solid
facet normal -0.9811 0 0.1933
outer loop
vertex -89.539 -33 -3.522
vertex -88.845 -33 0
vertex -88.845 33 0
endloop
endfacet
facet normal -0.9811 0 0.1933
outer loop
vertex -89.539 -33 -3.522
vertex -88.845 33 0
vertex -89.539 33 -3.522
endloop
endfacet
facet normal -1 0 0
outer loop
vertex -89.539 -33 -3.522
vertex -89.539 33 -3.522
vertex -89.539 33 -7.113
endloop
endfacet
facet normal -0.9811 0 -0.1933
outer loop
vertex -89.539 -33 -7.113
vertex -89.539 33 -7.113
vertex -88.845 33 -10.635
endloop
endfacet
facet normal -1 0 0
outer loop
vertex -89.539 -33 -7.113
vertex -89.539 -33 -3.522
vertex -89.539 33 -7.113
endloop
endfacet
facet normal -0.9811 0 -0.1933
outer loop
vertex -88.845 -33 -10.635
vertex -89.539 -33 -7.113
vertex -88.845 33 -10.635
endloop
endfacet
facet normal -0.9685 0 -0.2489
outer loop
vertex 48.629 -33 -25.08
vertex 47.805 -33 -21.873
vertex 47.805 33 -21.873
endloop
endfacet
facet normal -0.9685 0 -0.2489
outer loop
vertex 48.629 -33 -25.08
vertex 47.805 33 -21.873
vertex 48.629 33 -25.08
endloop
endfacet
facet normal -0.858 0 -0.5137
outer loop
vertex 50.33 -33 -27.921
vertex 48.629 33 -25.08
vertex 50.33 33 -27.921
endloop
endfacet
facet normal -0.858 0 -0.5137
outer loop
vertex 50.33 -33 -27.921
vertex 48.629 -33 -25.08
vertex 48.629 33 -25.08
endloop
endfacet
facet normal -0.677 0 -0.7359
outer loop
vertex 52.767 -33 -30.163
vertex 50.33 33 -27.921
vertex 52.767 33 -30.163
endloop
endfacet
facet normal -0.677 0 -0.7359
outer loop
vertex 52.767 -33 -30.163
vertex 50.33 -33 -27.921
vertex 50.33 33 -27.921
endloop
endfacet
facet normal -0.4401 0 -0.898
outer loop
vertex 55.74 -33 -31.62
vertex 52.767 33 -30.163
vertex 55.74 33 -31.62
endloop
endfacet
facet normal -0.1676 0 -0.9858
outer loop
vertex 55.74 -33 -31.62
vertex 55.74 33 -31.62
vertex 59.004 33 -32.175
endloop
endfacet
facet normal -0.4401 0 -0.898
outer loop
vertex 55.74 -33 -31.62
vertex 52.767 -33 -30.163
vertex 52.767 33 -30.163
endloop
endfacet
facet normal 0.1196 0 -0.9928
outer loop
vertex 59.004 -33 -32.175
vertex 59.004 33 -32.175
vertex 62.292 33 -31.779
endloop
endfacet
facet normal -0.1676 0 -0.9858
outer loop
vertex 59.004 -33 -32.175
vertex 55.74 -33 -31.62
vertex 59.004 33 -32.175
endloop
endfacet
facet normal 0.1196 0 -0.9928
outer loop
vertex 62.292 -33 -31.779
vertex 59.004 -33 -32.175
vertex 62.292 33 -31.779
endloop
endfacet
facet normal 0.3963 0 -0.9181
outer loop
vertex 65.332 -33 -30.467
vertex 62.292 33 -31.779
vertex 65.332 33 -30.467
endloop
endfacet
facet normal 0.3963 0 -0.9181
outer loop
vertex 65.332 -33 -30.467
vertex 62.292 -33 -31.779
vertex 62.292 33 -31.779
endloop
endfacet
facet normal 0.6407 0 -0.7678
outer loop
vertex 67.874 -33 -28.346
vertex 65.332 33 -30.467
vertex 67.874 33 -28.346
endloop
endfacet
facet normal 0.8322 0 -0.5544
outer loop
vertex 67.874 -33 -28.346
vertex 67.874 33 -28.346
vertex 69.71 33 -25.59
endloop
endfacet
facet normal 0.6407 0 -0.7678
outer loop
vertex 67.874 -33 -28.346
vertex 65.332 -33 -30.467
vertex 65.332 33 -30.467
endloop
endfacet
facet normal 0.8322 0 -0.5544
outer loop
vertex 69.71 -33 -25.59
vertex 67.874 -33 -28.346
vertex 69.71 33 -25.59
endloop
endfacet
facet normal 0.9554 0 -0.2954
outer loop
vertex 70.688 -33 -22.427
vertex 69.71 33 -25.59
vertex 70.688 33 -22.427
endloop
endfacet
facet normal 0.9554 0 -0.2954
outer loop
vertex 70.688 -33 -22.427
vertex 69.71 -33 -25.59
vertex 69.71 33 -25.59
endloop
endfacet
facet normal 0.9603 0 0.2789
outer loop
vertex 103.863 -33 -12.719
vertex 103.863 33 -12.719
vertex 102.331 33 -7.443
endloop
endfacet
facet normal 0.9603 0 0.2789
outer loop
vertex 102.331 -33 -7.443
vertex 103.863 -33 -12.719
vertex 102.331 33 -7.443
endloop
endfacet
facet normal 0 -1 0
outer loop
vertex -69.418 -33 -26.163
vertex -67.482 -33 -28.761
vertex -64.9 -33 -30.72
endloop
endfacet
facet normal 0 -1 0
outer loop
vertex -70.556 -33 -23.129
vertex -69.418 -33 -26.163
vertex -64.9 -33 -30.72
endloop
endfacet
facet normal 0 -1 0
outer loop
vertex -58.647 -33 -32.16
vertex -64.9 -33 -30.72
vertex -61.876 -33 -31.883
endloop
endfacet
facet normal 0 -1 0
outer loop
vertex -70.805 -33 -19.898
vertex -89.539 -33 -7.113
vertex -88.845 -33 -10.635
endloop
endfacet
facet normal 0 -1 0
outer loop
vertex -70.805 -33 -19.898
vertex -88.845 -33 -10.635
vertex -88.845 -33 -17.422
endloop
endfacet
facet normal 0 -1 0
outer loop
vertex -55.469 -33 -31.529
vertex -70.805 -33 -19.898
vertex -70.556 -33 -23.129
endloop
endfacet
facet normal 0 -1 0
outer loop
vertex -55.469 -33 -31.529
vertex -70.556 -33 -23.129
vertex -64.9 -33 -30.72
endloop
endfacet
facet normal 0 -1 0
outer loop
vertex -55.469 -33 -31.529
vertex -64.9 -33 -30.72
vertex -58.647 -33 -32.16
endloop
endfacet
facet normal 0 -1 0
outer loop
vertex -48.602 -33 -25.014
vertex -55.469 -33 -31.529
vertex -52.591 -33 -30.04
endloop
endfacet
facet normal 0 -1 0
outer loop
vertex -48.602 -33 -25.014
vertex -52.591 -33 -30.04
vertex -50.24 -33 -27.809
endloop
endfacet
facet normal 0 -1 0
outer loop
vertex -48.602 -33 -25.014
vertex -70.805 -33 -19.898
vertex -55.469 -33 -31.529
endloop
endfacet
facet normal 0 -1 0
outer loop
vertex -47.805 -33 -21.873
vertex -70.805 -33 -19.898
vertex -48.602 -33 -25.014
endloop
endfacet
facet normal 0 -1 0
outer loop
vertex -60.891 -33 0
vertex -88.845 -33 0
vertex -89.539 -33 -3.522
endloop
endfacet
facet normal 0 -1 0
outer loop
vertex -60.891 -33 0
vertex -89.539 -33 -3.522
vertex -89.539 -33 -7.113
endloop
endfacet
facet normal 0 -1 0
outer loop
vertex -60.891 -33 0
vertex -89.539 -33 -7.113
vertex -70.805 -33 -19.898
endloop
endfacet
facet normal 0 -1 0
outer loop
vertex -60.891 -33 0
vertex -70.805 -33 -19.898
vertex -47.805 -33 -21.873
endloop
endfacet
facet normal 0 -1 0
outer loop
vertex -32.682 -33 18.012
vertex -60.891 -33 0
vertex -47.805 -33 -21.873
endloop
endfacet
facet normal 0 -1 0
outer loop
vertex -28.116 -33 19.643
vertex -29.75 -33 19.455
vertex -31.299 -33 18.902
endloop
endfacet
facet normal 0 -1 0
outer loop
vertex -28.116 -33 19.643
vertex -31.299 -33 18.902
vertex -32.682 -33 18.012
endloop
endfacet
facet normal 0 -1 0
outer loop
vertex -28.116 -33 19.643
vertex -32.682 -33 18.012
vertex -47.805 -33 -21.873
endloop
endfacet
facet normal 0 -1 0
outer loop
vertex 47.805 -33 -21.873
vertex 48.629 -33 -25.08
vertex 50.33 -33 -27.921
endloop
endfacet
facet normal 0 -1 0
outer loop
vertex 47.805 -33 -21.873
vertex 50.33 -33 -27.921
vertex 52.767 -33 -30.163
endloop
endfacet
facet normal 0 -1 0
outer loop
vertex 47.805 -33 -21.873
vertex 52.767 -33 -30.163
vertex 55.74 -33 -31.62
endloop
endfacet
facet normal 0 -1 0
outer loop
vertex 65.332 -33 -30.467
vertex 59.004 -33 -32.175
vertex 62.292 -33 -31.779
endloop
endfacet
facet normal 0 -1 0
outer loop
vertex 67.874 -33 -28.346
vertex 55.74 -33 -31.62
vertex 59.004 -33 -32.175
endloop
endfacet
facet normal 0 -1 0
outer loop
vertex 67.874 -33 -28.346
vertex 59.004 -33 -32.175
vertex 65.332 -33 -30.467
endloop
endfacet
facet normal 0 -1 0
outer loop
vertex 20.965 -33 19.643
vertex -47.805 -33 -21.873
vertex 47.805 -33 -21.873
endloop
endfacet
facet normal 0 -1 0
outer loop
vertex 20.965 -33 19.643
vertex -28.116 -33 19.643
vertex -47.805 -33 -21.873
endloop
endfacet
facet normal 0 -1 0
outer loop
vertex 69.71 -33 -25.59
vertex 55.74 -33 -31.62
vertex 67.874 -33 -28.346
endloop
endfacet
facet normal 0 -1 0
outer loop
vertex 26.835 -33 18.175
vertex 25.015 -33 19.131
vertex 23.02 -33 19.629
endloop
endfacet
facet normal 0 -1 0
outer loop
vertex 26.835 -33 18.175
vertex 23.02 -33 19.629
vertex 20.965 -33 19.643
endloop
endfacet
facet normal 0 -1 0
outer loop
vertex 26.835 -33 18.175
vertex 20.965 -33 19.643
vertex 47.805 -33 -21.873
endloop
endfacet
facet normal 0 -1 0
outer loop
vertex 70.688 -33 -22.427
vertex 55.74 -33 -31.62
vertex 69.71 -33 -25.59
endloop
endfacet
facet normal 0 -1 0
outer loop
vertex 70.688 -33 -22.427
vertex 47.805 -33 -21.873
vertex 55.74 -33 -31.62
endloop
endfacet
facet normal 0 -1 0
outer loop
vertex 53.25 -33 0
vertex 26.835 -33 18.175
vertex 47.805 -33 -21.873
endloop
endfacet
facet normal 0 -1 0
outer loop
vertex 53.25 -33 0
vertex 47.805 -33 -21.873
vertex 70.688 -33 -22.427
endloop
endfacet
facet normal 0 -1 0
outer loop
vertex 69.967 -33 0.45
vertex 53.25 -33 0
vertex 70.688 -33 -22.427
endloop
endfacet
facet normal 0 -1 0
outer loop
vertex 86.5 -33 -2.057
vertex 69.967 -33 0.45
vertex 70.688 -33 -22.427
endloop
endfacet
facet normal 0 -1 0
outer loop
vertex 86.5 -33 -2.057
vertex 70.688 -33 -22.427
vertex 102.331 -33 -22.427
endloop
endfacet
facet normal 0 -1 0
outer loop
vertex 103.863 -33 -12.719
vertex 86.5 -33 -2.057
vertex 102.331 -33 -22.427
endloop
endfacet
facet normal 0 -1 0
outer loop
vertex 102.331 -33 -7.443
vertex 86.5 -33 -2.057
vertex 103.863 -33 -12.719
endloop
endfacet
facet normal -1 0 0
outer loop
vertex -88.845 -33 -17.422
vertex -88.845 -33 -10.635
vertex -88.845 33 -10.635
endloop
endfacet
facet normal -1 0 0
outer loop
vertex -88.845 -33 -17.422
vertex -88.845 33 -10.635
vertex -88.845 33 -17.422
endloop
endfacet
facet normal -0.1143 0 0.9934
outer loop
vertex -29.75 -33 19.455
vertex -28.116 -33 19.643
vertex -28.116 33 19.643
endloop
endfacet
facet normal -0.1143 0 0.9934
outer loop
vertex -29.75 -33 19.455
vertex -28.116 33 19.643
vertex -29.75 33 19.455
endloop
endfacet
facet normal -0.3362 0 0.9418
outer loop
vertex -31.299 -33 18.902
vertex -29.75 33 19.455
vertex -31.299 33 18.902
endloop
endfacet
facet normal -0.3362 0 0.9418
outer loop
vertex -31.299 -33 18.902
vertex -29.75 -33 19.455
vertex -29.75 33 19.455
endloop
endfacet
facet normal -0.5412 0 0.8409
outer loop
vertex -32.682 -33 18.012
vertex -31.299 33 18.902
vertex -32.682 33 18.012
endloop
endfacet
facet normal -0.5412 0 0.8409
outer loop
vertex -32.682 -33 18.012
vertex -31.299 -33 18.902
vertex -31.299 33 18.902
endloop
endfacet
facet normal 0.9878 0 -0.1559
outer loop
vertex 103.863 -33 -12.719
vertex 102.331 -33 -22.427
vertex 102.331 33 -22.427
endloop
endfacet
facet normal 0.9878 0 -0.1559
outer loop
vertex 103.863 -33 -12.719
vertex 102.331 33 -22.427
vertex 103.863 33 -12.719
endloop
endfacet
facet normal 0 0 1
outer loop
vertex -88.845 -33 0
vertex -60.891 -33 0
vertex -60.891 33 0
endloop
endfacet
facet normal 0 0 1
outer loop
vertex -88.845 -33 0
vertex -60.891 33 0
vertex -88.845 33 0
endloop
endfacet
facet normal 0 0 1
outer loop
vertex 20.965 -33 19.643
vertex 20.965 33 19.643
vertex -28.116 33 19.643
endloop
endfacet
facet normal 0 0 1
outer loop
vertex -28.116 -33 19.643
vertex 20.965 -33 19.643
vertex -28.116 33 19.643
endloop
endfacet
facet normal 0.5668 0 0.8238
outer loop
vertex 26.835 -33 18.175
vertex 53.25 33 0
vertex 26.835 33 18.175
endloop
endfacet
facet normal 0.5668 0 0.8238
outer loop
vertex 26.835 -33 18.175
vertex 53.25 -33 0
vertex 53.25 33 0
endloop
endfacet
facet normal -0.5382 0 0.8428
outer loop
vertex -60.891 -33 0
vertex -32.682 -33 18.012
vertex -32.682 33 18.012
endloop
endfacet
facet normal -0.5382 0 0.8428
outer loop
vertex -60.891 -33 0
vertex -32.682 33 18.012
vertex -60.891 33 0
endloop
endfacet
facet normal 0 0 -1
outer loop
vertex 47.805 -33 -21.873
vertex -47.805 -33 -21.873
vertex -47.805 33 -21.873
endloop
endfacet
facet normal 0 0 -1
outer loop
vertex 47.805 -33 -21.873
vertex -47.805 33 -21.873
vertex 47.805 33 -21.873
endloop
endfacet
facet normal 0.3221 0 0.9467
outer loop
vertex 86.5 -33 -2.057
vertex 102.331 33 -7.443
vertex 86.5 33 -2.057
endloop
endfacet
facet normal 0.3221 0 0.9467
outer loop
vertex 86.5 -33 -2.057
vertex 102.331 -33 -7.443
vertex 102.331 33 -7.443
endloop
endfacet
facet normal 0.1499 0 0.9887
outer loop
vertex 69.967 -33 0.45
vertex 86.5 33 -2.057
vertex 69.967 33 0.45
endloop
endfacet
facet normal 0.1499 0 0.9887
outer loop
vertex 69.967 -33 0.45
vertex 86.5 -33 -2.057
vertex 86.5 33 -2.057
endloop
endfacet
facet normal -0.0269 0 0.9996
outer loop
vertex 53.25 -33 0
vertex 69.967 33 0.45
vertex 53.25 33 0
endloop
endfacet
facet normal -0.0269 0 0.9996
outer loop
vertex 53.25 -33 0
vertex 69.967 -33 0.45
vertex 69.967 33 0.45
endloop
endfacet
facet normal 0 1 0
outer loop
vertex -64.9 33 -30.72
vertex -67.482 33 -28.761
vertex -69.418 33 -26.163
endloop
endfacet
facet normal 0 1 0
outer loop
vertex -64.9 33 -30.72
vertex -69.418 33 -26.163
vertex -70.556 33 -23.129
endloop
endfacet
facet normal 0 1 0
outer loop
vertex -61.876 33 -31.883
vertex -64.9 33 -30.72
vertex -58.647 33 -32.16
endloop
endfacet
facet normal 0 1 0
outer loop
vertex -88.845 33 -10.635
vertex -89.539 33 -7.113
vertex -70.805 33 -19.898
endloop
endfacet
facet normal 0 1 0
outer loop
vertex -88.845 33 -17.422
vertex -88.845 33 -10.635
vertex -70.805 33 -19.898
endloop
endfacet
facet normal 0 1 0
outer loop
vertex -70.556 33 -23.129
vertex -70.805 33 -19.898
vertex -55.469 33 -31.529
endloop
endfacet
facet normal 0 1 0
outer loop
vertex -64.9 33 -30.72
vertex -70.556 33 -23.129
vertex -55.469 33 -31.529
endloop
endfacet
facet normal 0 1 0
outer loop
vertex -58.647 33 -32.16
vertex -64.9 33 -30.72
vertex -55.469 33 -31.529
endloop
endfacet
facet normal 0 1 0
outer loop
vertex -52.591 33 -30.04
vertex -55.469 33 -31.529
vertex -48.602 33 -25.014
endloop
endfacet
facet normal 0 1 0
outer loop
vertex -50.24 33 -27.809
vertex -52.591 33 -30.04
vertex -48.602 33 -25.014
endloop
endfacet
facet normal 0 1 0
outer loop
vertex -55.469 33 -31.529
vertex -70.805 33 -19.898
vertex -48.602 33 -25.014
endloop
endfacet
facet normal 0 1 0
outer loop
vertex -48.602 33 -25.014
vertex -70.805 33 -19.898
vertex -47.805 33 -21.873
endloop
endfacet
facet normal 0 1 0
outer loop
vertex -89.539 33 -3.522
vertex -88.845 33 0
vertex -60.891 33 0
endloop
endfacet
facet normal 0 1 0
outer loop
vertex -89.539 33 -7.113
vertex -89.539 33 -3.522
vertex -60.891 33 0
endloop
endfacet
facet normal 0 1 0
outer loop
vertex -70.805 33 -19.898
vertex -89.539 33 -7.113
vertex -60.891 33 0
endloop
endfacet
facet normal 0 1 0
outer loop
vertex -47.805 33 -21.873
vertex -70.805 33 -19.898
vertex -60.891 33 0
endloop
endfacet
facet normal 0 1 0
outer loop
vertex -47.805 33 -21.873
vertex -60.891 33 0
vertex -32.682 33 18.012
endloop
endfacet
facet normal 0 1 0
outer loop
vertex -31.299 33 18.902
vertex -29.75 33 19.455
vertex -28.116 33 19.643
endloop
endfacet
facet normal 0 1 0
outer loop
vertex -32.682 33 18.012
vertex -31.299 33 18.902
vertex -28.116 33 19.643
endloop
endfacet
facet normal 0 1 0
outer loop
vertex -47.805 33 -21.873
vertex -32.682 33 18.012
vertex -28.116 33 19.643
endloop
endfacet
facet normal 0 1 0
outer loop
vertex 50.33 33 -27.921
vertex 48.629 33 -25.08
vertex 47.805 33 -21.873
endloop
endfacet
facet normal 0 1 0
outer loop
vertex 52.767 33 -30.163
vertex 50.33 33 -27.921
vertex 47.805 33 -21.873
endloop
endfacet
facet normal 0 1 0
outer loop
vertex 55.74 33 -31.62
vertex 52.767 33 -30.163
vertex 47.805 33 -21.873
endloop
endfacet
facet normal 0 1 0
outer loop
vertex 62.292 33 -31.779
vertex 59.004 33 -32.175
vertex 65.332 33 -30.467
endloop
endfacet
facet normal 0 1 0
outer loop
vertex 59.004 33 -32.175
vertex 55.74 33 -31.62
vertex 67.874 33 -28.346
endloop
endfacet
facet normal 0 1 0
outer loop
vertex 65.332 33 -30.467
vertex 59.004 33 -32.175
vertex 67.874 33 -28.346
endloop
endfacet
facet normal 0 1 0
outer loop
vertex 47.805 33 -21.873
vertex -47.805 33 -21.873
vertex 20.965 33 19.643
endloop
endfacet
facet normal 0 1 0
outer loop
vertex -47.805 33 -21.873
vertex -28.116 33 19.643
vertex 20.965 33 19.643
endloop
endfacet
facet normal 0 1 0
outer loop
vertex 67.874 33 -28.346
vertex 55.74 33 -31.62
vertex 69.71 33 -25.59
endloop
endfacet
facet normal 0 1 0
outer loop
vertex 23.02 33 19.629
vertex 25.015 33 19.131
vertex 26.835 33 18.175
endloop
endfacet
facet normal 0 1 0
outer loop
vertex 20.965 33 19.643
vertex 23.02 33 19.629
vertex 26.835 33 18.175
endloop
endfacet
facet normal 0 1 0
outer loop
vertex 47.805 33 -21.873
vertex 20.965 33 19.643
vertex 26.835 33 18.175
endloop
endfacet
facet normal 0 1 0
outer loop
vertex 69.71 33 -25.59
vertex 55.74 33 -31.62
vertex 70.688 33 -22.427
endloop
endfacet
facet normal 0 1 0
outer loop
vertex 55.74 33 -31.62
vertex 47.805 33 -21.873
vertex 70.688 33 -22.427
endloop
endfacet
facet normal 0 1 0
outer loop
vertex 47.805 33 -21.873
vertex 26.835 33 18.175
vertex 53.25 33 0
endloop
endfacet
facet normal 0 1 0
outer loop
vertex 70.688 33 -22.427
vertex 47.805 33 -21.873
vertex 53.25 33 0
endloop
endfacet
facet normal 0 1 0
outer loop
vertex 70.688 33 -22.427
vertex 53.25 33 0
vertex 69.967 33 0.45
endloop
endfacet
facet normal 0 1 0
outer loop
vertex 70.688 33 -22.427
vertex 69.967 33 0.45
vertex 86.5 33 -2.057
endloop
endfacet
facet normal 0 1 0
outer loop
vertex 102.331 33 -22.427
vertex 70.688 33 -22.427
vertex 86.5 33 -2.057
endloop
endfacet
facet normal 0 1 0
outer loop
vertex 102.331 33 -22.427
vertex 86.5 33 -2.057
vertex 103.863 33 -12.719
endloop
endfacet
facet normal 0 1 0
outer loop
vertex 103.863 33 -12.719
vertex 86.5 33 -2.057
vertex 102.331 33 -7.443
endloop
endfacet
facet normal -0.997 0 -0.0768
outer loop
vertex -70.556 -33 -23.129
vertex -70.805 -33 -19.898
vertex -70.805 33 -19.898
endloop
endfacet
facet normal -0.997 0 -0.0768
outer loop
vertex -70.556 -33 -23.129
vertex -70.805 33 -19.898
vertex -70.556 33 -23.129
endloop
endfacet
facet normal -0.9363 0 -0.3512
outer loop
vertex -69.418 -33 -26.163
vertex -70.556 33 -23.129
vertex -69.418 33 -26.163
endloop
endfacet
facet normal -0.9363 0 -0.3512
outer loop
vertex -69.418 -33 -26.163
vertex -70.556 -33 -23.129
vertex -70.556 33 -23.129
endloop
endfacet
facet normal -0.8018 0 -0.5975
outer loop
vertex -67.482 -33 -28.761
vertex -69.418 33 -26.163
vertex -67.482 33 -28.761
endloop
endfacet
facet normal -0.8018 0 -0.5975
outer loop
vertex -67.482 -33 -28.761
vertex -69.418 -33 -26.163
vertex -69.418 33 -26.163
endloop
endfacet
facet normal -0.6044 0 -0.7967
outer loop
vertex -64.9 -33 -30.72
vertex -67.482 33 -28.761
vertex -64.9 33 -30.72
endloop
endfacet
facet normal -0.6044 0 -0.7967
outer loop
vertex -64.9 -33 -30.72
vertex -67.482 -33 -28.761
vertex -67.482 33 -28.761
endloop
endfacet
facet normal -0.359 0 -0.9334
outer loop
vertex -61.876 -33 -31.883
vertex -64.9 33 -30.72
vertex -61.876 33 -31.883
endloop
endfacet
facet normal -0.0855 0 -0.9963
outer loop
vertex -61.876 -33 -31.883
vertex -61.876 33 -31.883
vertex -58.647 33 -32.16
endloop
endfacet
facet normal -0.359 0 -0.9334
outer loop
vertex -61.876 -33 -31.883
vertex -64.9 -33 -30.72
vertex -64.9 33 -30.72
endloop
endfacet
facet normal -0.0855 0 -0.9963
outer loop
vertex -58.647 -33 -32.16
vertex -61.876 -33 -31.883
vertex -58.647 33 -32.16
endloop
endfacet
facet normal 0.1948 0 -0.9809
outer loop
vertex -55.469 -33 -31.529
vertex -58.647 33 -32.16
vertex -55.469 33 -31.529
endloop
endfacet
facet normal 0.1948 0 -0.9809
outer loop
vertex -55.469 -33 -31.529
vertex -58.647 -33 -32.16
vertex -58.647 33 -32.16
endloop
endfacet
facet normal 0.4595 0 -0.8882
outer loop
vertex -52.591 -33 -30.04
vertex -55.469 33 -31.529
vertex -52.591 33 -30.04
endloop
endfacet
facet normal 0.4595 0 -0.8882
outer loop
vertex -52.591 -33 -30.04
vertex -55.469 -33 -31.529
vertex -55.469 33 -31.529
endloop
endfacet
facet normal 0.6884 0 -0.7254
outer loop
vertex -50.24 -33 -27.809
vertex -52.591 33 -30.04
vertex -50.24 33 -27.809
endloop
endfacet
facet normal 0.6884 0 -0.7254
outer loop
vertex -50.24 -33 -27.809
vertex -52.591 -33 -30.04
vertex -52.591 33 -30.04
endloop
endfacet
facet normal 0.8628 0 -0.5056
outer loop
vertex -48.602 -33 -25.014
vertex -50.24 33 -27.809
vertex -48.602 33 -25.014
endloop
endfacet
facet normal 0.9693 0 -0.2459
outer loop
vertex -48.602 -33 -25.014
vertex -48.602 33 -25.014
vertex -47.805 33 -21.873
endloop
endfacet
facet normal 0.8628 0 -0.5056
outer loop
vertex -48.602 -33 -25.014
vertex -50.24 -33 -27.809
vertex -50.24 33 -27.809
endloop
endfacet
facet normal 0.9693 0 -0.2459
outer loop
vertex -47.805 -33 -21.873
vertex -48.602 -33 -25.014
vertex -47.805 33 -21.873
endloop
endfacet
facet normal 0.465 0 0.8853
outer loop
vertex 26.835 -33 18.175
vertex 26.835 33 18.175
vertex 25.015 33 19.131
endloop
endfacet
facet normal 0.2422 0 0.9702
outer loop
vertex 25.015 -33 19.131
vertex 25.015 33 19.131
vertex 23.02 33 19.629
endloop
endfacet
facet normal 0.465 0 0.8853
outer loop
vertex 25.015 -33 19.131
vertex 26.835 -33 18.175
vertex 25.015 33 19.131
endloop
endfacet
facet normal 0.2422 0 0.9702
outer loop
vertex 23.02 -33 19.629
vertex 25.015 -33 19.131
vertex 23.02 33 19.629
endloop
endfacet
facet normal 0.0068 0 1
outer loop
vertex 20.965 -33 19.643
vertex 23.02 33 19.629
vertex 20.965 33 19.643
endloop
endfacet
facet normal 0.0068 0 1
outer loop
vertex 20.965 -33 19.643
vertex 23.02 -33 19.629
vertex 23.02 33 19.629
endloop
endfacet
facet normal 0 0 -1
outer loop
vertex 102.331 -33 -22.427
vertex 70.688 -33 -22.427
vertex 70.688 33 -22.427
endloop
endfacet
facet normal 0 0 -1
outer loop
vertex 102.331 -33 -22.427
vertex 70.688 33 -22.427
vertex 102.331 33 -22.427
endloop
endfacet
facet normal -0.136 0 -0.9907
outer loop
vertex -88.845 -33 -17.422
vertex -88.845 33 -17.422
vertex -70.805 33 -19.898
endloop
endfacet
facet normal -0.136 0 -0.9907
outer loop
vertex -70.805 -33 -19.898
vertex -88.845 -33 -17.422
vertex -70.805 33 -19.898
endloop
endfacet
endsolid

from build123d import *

# Parameters (mm, degrees)
F1_DEPTH = 33


with BuildPart() as f1:
    # F0 (on Front) → F1 (new body)
    with BuildSketch(Plane.XZ):
        with BuildLine():
            Line((0, 0), (53.250462, 0))
            Line((53.250462, 0), (26.834896, 18.175164))
            ThreePointArc((26.834896, 18.175164), (24.032478, 19.439506), (20.964772, 19.642696))
            Line((20.964772, 19.642696), (0, 19.642696))
            Line((0, 19.642696), (0, 0))
        make_face()
        with BuildLine():
            Line((40.881537, -12.428519), (53.250462, 0))
            Line((53.250462, 0), (0, 0))
            Line((0, 0), (0, -21.872539))
            Line((0, -21.872539), (37.131179, -21.872539))
            ThreePointArc((37.131179, -21.872539), (39.914753, -17.511266), (40.881537, -12.428519))
        make_face()
        with BuildLine():
            ThreePointArc((102.331229, -7.44311), (78.288954, -0.436962), (53.250462, 0))
            Line((53.250462, 0), (40.881537, -12.428519))
            ThreePointArc((40.881537, -12.428519), (39.914753, -17.511266), (37.131179, -21.872539))
            Line((37.131179, -21.872539), (47.805394, -21.872539))
            ThreePointArc((47.805394, -21.872539), (58.662919, -9.104587), (70.828642, -20.632885))
            ThreePointArc((70.828642, -20.632885), (70.793542, -21.532446), (70.688458, -22.426536))
            Line((70.688458, -22.426536), (102.331229, -22.426536))
            Line((102.331229, -22.426536), (103.862944, -12.71904))
            Line((103.862944, -12.71904), (102.331229, -7.44311))
        make_face()
        Polygon((0, -21.872539), (0, 0), (-34.451738, 0), (-30.538321, -21.872539), align=None)
        with BuildLine():
            Line((-34.451738, 0), (0, 0))
            Line((0, 0), (0, 19.642696))
            Line((0, 19.642696), (-28.115999, 19.642696))
            ThreePointArc((-28.115999, 19.642696), (-30.540046, 19.222817), (-32.681651, 18.012105))
            Line((-32.681651, 18.012105), (-60.890865, 0))
            Line((-60.890865, 0), (-34.451738, 0))
        make_face()
        with BuildLine():
            Line((-30.538321, -21.872539), (-34.451738, 0))
            Line((-34.451738, 0), (-60.890865, 0))
            Line((-60.890865, 0), (-88.844784, 0))
            ThreePointArc((-88.844784, 0), (-89.626398, -5.317535), (-88.844784, -10.63507))
            Line((-88.844784, -10.63507), (-88.844784, -17.421953))
            Line((-88.844784, -17.421953), (-70.805212, -19.897746))
            ThreePointArc((-70.805212, -19.897746), (-58.915888, -9.093747), (-47.738646, -20.632885))
            ThreePointArc((-47.738646, -20.632885), (-47.755345, -21.25361), (-47.805394, -21.872539))
            Line((-47.805394, -21.872539), (-30.538321, -21.872539))
        make_face()
        with BuildLine():
            ThreePointArc((70.828642, -20.632885), (58.662919, -9.104587), (47.805394, -21.872539))
            ThreePointArc((47.805394, -21.872539), (59.004222, -32.174501), (70.688458, -22.426536))
            ThreePointArc((70.688458, -22.426536), (70.793542, -21.532446), (70.828642, -20.632885))
        make_face()
        with BuildLine():
            ThreePointArc((-70.805212, -19.897746), (-60.271278, -32.135561), (-47.805394, -21.872539))
            ThreePointArc((-47.805394, -21.872539), (-47.755345, -21.25361), (-47.738646, -20.632885))
            ThreePointArc((-47.738646, -20.632885), (-58.915888, -9.093747), (-70.805212, -19.897746))
        make_face()
    extrude(amount=F1_DEPTH)

    # F2: F1 across plane


with BuildPart() as f1_1:
    add(f1.part)
    add(f1.part.mirror(Plane.XZ))


solid = f1_1.part
